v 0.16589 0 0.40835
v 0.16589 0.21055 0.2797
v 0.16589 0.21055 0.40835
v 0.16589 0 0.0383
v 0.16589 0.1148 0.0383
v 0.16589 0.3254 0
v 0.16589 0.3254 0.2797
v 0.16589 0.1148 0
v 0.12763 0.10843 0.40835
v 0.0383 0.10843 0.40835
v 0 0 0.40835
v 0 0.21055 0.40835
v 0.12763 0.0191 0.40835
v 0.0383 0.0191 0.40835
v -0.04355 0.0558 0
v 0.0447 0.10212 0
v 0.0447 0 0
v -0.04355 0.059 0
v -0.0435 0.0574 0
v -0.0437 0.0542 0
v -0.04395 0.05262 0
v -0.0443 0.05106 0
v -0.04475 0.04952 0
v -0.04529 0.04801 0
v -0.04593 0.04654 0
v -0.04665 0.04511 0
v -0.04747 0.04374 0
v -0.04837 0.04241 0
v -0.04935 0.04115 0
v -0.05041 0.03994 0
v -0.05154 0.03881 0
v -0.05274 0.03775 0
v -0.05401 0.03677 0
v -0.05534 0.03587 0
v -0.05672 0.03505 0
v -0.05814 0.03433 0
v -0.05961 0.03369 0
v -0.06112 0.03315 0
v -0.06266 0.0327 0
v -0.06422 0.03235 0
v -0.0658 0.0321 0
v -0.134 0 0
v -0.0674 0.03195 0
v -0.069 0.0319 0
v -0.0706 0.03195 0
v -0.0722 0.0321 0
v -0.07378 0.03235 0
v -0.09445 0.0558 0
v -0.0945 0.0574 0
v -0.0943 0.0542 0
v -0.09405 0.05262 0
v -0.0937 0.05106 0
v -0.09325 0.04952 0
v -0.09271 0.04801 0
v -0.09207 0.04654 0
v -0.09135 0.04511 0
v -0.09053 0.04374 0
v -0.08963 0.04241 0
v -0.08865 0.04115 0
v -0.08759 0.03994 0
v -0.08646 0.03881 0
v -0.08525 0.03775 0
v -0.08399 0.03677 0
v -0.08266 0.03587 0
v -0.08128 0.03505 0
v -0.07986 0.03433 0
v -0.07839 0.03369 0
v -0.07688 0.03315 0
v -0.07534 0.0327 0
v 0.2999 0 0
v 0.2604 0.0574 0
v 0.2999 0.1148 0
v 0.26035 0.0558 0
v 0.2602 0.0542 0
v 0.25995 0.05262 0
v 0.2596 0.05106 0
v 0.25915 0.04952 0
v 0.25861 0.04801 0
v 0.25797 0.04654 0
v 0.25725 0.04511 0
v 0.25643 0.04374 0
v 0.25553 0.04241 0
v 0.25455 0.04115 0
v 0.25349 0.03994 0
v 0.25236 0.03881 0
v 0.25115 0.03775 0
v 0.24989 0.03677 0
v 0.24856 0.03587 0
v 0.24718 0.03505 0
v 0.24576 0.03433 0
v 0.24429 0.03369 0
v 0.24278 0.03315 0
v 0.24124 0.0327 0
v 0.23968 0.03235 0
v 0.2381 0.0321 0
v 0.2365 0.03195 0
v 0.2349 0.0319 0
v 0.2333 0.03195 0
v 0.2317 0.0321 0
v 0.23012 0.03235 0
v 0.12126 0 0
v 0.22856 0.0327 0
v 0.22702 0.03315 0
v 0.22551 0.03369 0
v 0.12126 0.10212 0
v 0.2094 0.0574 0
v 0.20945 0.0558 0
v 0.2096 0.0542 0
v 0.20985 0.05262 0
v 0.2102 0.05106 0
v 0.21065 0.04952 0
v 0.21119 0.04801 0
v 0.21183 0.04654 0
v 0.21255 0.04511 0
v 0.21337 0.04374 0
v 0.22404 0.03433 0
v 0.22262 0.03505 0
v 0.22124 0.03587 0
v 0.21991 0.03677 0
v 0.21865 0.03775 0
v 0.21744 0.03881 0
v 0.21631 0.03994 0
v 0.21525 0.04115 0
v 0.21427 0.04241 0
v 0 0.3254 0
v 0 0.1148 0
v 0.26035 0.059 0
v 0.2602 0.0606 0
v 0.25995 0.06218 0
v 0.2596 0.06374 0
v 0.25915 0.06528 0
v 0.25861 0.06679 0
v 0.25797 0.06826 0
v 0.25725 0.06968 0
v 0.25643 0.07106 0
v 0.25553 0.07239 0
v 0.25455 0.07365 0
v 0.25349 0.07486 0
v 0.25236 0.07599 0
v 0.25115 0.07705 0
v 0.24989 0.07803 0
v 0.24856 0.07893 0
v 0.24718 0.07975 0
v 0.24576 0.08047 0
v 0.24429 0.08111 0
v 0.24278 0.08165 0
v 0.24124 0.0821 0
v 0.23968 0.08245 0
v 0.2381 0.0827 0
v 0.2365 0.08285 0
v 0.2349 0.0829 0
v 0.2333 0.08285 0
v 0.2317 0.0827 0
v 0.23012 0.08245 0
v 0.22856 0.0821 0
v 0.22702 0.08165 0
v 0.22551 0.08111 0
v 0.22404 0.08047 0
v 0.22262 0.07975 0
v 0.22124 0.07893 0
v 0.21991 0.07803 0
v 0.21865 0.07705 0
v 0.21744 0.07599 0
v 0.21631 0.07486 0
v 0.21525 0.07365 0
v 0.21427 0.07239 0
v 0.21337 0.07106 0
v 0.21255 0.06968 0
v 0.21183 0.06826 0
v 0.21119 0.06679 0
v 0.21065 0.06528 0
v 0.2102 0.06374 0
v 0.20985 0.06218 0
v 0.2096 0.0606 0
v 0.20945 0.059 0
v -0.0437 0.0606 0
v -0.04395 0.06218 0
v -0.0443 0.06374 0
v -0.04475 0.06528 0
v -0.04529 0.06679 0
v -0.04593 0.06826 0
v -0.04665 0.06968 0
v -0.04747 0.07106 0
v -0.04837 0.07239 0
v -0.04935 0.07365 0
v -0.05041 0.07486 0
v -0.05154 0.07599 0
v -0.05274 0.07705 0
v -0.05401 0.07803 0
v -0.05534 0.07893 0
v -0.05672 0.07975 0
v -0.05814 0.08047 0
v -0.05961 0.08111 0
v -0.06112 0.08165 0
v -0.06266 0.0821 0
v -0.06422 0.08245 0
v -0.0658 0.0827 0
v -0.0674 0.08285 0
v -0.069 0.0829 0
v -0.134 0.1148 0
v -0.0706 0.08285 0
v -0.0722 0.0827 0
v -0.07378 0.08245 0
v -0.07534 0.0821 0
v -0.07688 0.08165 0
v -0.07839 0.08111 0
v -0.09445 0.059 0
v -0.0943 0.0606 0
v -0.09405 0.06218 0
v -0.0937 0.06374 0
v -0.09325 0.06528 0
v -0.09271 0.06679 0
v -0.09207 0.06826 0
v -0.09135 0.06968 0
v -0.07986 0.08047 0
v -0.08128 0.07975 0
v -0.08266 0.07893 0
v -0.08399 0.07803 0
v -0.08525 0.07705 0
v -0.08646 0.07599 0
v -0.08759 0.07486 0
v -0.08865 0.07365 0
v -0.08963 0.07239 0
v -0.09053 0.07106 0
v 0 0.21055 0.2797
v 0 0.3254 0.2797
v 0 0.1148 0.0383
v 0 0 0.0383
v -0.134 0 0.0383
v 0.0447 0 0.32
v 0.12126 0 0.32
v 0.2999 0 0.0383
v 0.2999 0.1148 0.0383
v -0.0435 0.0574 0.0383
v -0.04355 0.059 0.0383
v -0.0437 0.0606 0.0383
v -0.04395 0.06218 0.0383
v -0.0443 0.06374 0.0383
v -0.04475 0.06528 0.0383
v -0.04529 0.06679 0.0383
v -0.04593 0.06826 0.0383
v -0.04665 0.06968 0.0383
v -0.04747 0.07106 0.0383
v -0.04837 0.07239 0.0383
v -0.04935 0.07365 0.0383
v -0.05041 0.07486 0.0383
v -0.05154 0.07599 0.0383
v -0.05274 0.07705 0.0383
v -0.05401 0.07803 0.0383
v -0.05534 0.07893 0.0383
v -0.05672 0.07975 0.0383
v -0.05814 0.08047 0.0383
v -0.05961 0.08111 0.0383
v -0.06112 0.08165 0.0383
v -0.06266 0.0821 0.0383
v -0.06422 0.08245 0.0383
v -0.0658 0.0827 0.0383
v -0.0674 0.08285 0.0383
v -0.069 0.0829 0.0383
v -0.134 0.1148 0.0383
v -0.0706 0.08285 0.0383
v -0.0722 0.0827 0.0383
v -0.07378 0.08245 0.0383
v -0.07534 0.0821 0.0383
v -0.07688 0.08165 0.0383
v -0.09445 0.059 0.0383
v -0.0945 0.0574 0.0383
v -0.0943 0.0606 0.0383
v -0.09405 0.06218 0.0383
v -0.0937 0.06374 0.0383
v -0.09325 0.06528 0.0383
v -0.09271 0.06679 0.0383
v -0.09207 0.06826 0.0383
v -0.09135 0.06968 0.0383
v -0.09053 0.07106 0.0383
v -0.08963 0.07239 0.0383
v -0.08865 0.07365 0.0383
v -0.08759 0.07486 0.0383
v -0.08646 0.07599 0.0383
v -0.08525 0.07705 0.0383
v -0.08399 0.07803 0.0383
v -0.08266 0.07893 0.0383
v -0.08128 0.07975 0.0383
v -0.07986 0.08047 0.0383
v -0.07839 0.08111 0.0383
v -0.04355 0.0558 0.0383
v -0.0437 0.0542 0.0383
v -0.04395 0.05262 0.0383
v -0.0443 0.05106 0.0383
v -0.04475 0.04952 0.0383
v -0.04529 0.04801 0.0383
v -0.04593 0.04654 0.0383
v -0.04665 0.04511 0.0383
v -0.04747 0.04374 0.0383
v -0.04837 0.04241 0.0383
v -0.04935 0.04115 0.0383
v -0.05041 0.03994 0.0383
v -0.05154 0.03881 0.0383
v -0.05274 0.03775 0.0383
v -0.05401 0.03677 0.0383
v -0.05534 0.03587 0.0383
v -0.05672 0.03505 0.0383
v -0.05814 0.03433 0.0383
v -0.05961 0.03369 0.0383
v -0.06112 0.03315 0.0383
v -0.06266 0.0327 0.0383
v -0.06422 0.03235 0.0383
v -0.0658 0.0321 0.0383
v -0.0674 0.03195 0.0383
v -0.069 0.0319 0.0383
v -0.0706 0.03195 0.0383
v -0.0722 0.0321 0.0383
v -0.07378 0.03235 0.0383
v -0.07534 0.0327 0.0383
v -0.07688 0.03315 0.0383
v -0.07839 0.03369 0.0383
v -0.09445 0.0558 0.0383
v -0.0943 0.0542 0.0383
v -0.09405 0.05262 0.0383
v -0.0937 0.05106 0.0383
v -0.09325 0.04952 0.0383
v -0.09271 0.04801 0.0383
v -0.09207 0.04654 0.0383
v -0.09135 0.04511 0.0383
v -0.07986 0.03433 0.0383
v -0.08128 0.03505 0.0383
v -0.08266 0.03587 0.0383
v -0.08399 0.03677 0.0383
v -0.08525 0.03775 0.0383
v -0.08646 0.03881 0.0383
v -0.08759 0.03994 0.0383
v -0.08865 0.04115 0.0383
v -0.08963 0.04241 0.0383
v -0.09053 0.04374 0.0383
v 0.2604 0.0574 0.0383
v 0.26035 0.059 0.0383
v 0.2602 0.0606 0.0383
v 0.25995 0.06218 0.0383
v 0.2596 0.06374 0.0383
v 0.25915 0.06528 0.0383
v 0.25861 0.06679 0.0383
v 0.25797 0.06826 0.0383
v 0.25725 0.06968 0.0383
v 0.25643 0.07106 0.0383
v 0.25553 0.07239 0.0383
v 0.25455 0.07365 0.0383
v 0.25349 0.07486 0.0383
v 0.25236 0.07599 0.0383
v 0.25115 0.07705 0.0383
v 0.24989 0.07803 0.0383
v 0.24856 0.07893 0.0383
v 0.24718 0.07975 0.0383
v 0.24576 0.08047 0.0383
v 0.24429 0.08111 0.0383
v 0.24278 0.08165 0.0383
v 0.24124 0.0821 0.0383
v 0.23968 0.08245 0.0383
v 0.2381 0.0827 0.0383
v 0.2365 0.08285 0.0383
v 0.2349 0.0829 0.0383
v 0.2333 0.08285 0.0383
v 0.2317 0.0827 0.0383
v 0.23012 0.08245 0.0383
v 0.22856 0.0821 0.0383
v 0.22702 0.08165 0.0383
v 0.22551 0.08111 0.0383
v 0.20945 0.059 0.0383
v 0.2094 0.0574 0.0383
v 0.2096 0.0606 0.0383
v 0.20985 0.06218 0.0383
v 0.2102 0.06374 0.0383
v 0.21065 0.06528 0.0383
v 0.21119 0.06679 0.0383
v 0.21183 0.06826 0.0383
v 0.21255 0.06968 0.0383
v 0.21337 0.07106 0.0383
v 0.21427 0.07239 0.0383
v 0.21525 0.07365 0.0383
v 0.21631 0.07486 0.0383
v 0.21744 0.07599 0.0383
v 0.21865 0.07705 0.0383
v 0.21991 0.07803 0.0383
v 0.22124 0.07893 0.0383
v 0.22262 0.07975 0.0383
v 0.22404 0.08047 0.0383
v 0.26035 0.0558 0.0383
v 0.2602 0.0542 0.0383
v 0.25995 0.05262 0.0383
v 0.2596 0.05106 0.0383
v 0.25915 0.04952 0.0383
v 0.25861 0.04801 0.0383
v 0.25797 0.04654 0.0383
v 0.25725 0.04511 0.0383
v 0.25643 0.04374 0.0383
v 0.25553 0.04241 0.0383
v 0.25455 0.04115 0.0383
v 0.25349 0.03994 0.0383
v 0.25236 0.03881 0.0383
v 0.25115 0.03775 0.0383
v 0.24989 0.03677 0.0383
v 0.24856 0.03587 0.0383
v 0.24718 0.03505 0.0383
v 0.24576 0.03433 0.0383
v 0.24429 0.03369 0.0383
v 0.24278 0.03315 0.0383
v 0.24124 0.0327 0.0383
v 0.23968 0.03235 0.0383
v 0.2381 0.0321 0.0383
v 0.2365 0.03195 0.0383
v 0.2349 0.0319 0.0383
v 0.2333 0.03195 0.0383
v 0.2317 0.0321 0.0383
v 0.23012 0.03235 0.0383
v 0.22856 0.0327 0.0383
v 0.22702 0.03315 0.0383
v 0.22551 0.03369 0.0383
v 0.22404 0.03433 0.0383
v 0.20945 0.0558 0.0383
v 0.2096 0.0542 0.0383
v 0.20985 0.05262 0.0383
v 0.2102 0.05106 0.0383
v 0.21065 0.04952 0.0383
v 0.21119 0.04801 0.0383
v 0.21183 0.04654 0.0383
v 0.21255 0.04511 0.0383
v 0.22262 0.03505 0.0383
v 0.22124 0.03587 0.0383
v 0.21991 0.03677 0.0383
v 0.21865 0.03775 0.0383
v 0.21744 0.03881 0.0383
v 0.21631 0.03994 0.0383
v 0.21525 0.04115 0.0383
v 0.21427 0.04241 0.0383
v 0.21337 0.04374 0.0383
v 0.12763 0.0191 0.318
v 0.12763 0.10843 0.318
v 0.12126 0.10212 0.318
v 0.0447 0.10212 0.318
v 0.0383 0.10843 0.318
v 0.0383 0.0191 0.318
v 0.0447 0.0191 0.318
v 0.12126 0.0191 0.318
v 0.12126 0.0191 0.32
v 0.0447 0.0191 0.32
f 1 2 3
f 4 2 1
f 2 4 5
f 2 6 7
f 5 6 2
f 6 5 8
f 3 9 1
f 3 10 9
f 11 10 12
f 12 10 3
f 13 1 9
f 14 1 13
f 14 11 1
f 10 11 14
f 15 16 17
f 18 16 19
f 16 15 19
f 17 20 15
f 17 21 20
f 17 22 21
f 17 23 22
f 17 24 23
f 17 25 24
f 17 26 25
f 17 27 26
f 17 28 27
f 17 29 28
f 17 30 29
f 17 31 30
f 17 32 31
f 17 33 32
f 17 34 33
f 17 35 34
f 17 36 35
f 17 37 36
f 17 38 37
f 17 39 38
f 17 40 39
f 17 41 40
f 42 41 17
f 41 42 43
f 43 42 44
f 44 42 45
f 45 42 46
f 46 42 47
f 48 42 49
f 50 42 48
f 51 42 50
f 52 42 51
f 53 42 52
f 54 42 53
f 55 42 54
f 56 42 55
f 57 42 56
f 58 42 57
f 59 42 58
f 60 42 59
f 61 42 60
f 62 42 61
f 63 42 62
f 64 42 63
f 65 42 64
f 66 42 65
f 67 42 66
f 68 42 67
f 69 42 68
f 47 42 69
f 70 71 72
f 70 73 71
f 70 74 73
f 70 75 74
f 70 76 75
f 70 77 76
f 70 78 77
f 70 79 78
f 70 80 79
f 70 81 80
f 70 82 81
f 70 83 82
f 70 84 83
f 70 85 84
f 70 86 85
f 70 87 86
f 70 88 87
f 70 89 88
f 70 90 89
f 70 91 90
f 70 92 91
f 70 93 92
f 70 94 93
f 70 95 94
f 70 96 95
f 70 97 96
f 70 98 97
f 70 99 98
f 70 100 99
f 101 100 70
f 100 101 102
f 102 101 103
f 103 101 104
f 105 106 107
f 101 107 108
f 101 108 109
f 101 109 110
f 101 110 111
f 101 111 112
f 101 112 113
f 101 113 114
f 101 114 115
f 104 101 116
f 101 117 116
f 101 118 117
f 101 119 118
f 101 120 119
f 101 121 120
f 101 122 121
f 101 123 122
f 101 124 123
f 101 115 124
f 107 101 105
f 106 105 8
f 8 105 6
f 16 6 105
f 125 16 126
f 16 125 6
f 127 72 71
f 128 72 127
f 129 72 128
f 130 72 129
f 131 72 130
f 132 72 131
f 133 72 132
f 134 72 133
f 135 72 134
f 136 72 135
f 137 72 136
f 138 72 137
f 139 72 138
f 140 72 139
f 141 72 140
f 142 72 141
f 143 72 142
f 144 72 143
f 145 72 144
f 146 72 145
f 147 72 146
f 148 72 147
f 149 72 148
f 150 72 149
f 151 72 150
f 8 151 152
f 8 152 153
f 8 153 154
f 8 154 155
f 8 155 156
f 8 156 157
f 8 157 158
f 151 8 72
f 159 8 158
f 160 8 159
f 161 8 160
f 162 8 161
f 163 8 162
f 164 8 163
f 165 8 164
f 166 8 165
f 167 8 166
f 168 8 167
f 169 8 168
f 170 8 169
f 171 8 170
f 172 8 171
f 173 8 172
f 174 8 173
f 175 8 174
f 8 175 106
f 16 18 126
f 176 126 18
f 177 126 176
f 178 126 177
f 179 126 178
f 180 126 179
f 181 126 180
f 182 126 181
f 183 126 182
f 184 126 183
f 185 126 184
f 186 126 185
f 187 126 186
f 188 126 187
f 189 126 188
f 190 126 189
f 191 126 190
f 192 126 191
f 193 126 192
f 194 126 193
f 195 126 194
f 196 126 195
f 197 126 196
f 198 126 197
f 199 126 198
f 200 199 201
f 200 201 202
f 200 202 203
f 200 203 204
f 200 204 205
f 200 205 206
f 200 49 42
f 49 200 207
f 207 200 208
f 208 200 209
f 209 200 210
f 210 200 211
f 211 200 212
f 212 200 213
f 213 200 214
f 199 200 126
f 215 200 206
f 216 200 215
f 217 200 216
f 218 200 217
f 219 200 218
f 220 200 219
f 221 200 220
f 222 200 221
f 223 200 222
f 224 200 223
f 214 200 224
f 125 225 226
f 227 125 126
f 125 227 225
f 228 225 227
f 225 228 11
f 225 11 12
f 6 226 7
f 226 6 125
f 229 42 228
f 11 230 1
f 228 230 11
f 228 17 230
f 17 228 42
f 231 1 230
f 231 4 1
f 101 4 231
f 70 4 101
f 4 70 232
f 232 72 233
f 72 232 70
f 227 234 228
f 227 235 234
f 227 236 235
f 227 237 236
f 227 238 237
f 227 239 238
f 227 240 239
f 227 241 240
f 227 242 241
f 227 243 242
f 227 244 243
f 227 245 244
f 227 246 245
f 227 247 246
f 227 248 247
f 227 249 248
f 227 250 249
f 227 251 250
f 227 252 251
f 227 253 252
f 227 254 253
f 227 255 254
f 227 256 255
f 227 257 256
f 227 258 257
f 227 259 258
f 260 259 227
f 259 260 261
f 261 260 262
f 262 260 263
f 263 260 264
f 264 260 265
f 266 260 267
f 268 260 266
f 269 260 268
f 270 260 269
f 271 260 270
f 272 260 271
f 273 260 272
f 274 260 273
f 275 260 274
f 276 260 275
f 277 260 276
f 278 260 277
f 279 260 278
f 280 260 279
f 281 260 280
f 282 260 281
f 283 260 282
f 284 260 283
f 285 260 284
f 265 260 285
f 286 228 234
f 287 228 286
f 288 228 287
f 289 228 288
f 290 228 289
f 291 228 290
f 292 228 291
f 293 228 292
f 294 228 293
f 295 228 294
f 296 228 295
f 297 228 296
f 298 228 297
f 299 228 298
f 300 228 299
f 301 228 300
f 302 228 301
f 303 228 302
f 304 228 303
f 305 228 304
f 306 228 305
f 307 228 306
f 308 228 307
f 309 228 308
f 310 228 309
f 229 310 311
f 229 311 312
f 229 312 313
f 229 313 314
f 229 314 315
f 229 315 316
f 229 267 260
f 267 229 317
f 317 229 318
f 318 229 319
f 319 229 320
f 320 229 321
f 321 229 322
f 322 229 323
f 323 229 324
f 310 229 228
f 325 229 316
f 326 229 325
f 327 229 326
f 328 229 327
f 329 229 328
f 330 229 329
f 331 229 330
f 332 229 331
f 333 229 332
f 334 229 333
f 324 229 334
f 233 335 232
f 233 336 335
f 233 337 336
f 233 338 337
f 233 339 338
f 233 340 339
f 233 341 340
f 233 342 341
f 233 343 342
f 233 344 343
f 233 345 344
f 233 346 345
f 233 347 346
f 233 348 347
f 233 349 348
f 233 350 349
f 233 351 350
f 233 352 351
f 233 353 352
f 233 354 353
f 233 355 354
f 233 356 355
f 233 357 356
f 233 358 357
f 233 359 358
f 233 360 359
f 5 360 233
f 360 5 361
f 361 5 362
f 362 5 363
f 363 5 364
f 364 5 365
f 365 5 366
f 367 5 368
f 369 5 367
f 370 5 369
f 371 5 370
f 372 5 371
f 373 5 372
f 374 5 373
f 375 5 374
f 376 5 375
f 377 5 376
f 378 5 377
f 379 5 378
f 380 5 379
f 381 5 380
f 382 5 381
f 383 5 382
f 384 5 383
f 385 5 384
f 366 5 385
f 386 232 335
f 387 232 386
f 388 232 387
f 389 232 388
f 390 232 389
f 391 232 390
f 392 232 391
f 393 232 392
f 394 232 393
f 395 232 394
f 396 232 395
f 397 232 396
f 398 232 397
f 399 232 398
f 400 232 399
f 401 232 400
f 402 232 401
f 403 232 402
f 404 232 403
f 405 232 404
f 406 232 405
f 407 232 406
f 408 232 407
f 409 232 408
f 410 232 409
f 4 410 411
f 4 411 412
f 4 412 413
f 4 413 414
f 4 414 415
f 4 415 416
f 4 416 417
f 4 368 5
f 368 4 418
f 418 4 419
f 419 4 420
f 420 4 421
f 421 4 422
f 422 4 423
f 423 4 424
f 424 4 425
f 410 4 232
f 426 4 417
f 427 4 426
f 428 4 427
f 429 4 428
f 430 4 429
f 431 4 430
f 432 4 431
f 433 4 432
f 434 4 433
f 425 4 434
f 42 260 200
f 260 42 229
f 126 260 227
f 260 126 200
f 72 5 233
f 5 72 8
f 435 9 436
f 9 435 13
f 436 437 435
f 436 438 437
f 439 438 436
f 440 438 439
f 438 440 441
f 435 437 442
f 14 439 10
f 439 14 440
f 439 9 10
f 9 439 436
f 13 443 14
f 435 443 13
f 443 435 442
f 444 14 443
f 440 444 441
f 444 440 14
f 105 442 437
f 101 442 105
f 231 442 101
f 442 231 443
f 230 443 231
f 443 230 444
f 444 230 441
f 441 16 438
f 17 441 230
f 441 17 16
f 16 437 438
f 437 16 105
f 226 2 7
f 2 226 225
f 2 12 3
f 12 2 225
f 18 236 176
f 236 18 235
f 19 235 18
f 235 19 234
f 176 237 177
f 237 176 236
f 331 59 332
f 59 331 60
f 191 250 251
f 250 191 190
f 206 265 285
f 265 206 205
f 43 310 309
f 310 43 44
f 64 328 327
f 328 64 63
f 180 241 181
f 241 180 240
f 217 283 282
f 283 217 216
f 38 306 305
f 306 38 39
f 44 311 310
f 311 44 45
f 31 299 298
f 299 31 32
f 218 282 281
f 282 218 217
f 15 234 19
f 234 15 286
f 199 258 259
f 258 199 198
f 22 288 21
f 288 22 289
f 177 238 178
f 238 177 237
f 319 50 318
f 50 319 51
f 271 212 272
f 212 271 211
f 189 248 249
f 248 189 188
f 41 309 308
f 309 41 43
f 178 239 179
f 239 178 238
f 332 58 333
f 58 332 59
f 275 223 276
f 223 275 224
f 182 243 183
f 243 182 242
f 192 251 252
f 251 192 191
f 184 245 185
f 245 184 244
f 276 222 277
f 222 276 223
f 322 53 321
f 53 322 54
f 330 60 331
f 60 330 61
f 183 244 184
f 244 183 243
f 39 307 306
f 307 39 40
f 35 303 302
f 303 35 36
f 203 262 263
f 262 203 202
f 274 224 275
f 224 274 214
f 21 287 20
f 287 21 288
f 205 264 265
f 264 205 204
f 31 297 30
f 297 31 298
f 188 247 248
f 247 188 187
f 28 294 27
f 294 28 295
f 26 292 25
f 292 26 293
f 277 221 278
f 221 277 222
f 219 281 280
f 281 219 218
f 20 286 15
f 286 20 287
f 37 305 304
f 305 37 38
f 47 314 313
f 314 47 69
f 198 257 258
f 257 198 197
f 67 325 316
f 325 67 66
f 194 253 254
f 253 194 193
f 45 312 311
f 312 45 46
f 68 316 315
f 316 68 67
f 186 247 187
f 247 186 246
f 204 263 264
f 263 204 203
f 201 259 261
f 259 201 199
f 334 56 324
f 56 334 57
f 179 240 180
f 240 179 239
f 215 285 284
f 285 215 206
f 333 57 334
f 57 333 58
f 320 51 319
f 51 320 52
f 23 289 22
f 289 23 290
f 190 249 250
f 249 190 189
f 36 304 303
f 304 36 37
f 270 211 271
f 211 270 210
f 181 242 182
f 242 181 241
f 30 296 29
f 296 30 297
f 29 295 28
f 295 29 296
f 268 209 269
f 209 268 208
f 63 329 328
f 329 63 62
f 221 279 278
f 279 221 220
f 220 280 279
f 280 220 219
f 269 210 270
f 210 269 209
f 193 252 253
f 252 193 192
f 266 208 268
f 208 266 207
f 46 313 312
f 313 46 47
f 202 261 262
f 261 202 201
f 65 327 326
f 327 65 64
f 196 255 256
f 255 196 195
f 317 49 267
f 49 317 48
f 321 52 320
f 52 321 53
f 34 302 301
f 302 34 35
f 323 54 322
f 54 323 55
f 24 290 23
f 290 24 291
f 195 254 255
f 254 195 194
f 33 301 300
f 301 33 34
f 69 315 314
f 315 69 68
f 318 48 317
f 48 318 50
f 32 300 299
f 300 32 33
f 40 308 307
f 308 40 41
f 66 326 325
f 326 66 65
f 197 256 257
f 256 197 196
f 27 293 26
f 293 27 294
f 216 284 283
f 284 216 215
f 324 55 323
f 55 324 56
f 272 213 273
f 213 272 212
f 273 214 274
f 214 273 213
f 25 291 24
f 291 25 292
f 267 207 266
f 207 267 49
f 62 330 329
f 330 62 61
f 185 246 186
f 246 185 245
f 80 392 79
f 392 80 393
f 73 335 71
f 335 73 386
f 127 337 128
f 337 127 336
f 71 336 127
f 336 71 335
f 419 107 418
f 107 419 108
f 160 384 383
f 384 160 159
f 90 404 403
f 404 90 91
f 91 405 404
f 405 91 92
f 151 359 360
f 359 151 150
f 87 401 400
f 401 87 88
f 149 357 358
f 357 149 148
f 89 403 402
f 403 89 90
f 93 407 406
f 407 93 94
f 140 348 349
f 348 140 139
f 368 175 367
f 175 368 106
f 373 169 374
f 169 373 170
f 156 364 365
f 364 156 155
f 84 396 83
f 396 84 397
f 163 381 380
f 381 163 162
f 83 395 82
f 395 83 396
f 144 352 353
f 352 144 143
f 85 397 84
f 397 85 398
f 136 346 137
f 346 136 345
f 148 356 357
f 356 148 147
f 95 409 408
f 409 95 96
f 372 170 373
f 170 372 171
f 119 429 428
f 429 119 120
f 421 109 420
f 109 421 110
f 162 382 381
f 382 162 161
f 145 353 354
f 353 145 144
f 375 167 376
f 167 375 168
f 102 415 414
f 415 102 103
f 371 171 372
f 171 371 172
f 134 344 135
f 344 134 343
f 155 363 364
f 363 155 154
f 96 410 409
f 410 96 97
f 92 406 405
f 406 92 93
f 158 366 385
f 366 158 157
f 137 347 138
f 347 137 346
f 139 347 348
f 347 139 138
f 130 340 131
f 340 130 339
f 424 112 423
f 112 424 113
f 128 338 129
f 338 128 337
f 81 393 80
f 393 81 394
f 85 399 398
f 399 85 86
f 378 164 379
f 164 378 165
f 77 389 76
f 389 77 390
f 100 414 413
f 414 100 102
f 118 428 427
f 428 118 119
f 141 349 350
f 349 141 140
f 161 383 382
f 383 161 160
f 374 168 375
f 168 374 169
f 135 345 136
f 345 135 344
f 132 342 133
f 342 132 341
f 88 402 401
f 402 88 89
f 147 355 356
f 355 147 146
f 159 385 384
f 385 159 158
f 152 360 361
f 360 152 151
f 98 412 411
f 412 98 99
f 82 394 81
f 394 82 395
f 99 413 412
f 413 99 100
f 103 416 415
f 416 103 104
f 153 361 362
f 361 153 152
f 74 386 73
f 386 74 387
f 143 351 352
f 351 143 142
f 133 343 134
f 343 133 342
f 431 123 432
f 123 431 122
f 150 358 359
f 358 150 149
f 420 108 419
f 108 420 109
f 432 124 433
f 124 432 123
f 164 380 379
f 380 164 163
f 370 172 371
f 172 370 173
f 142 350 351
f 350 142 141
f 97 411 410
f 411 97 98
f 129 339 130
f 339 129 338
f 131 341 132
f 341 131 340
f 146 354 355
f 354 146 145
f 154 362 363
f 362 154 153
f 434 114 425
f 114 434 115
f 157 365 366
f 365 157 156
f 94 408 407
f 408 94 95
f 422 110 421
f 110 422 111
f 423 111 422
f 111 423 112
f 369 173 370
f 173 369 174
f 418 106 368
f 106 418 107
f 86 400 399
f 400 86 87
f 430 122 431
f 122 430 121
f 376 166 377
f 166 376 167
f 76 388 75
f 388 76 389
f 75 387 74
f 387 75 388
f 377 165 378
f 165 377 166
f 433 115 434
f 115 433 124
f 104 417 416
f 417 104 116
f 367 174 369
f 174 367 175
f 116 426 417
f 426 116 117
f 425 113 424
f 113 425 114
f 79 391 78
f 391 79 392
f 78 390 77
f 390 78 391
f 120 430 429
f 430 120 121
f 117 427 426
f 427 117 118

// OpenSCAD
// === Parameters ===

// Main base dimensions
main_length  = 0.165891;   // X
main_width   = 0.325401;   // Y (front=0, back=max)
main_height  = 0.408347;   // Z

// Top square recess
recess_size     = 0.089326;
recess_x_off    = 0.0383;   // left/right offset
recess_y_front  = 0.0191;   // from front edge
recess_z_start  = 0.319;    // bottom of recess

// Lower rectangular opening
open_x_size   = 0.076565;
open_y_size   = 0.132416;
open_x_off    = 0.0447;     // left offset
open_y_off    = -0.0303;    // front offset (negative = beyond front face)
open_z_top    = 0.319;      // top of opening band

// Upper back strip removal
strip_y_width = 0.114848;   // Y extent measured from back edge
strip_z_start = 0.2807;     // bottom of strip cut

// Shallow base-level extension
base_ext_height = 0.0383;   // Z height
base_ext_x      = 0.4339;   // X span
base_ext_y      = 0.1148;   // Y span (front portion)
base_ext_proj   = 0.134;    // projection beyond each side in X

// Through-hole parameters in shallow section
hole_r       = 0.0255;      // radius
hole_y_pos   = 0.0574;      // Y center from front edge
hole_x1      = -0.069;      // X center relative to main base left edge
hole_x2      = 0.2349;      // X center relative to main base left edge

// Resolution
$fn = 100;

// Small epsilon for clean boolean cuts
eps = 0.001;

// === Assembly ===
difference() {
    union() {
        // Step 1: Main rectangular base block
        cube([main_length, main_width, main_height]);

        // Step 5: Shallow base-level section extending beyond both sides
        translate([-base_ext_proj, 0, 0])
            cube([base_ext_x, base_ext_y, base_ext_height]);
    }

    // Step 2: Square recess cut from the top
    translate([recess_x_off, recess_y_front, recess_z_start - eps])
        cube([recess_size, recess_size, main_height - recess_z_start + 2*eps]);

    // Step 3: Lower rectangular through-opening
    translate([open_x_off, open_y_off, -eps])
        cube([open_x_size, open_y_size, open_z_top + 2*eps]);

    // Step 4: Upper back strip removal (high-to-low step)
    translate([-eps, main_width - strip_y_width, strip_z_start - eps])
        cube([main_length + 2*eps, strip_y_width + eps, main_height - strip_z_start + 2*eps]);

    // Step 6: Two circular through-holes in shallow section
    translate([hole_x1, hole_y_pos, -eps])
        cylinder(r = hole_r, h = base_ext_height + 2*eps);

    translate([hole_x2, hole_y_pos, -eps])
        cylinder(r = hole_r, h = base_ext_height + 2*eps);
}
